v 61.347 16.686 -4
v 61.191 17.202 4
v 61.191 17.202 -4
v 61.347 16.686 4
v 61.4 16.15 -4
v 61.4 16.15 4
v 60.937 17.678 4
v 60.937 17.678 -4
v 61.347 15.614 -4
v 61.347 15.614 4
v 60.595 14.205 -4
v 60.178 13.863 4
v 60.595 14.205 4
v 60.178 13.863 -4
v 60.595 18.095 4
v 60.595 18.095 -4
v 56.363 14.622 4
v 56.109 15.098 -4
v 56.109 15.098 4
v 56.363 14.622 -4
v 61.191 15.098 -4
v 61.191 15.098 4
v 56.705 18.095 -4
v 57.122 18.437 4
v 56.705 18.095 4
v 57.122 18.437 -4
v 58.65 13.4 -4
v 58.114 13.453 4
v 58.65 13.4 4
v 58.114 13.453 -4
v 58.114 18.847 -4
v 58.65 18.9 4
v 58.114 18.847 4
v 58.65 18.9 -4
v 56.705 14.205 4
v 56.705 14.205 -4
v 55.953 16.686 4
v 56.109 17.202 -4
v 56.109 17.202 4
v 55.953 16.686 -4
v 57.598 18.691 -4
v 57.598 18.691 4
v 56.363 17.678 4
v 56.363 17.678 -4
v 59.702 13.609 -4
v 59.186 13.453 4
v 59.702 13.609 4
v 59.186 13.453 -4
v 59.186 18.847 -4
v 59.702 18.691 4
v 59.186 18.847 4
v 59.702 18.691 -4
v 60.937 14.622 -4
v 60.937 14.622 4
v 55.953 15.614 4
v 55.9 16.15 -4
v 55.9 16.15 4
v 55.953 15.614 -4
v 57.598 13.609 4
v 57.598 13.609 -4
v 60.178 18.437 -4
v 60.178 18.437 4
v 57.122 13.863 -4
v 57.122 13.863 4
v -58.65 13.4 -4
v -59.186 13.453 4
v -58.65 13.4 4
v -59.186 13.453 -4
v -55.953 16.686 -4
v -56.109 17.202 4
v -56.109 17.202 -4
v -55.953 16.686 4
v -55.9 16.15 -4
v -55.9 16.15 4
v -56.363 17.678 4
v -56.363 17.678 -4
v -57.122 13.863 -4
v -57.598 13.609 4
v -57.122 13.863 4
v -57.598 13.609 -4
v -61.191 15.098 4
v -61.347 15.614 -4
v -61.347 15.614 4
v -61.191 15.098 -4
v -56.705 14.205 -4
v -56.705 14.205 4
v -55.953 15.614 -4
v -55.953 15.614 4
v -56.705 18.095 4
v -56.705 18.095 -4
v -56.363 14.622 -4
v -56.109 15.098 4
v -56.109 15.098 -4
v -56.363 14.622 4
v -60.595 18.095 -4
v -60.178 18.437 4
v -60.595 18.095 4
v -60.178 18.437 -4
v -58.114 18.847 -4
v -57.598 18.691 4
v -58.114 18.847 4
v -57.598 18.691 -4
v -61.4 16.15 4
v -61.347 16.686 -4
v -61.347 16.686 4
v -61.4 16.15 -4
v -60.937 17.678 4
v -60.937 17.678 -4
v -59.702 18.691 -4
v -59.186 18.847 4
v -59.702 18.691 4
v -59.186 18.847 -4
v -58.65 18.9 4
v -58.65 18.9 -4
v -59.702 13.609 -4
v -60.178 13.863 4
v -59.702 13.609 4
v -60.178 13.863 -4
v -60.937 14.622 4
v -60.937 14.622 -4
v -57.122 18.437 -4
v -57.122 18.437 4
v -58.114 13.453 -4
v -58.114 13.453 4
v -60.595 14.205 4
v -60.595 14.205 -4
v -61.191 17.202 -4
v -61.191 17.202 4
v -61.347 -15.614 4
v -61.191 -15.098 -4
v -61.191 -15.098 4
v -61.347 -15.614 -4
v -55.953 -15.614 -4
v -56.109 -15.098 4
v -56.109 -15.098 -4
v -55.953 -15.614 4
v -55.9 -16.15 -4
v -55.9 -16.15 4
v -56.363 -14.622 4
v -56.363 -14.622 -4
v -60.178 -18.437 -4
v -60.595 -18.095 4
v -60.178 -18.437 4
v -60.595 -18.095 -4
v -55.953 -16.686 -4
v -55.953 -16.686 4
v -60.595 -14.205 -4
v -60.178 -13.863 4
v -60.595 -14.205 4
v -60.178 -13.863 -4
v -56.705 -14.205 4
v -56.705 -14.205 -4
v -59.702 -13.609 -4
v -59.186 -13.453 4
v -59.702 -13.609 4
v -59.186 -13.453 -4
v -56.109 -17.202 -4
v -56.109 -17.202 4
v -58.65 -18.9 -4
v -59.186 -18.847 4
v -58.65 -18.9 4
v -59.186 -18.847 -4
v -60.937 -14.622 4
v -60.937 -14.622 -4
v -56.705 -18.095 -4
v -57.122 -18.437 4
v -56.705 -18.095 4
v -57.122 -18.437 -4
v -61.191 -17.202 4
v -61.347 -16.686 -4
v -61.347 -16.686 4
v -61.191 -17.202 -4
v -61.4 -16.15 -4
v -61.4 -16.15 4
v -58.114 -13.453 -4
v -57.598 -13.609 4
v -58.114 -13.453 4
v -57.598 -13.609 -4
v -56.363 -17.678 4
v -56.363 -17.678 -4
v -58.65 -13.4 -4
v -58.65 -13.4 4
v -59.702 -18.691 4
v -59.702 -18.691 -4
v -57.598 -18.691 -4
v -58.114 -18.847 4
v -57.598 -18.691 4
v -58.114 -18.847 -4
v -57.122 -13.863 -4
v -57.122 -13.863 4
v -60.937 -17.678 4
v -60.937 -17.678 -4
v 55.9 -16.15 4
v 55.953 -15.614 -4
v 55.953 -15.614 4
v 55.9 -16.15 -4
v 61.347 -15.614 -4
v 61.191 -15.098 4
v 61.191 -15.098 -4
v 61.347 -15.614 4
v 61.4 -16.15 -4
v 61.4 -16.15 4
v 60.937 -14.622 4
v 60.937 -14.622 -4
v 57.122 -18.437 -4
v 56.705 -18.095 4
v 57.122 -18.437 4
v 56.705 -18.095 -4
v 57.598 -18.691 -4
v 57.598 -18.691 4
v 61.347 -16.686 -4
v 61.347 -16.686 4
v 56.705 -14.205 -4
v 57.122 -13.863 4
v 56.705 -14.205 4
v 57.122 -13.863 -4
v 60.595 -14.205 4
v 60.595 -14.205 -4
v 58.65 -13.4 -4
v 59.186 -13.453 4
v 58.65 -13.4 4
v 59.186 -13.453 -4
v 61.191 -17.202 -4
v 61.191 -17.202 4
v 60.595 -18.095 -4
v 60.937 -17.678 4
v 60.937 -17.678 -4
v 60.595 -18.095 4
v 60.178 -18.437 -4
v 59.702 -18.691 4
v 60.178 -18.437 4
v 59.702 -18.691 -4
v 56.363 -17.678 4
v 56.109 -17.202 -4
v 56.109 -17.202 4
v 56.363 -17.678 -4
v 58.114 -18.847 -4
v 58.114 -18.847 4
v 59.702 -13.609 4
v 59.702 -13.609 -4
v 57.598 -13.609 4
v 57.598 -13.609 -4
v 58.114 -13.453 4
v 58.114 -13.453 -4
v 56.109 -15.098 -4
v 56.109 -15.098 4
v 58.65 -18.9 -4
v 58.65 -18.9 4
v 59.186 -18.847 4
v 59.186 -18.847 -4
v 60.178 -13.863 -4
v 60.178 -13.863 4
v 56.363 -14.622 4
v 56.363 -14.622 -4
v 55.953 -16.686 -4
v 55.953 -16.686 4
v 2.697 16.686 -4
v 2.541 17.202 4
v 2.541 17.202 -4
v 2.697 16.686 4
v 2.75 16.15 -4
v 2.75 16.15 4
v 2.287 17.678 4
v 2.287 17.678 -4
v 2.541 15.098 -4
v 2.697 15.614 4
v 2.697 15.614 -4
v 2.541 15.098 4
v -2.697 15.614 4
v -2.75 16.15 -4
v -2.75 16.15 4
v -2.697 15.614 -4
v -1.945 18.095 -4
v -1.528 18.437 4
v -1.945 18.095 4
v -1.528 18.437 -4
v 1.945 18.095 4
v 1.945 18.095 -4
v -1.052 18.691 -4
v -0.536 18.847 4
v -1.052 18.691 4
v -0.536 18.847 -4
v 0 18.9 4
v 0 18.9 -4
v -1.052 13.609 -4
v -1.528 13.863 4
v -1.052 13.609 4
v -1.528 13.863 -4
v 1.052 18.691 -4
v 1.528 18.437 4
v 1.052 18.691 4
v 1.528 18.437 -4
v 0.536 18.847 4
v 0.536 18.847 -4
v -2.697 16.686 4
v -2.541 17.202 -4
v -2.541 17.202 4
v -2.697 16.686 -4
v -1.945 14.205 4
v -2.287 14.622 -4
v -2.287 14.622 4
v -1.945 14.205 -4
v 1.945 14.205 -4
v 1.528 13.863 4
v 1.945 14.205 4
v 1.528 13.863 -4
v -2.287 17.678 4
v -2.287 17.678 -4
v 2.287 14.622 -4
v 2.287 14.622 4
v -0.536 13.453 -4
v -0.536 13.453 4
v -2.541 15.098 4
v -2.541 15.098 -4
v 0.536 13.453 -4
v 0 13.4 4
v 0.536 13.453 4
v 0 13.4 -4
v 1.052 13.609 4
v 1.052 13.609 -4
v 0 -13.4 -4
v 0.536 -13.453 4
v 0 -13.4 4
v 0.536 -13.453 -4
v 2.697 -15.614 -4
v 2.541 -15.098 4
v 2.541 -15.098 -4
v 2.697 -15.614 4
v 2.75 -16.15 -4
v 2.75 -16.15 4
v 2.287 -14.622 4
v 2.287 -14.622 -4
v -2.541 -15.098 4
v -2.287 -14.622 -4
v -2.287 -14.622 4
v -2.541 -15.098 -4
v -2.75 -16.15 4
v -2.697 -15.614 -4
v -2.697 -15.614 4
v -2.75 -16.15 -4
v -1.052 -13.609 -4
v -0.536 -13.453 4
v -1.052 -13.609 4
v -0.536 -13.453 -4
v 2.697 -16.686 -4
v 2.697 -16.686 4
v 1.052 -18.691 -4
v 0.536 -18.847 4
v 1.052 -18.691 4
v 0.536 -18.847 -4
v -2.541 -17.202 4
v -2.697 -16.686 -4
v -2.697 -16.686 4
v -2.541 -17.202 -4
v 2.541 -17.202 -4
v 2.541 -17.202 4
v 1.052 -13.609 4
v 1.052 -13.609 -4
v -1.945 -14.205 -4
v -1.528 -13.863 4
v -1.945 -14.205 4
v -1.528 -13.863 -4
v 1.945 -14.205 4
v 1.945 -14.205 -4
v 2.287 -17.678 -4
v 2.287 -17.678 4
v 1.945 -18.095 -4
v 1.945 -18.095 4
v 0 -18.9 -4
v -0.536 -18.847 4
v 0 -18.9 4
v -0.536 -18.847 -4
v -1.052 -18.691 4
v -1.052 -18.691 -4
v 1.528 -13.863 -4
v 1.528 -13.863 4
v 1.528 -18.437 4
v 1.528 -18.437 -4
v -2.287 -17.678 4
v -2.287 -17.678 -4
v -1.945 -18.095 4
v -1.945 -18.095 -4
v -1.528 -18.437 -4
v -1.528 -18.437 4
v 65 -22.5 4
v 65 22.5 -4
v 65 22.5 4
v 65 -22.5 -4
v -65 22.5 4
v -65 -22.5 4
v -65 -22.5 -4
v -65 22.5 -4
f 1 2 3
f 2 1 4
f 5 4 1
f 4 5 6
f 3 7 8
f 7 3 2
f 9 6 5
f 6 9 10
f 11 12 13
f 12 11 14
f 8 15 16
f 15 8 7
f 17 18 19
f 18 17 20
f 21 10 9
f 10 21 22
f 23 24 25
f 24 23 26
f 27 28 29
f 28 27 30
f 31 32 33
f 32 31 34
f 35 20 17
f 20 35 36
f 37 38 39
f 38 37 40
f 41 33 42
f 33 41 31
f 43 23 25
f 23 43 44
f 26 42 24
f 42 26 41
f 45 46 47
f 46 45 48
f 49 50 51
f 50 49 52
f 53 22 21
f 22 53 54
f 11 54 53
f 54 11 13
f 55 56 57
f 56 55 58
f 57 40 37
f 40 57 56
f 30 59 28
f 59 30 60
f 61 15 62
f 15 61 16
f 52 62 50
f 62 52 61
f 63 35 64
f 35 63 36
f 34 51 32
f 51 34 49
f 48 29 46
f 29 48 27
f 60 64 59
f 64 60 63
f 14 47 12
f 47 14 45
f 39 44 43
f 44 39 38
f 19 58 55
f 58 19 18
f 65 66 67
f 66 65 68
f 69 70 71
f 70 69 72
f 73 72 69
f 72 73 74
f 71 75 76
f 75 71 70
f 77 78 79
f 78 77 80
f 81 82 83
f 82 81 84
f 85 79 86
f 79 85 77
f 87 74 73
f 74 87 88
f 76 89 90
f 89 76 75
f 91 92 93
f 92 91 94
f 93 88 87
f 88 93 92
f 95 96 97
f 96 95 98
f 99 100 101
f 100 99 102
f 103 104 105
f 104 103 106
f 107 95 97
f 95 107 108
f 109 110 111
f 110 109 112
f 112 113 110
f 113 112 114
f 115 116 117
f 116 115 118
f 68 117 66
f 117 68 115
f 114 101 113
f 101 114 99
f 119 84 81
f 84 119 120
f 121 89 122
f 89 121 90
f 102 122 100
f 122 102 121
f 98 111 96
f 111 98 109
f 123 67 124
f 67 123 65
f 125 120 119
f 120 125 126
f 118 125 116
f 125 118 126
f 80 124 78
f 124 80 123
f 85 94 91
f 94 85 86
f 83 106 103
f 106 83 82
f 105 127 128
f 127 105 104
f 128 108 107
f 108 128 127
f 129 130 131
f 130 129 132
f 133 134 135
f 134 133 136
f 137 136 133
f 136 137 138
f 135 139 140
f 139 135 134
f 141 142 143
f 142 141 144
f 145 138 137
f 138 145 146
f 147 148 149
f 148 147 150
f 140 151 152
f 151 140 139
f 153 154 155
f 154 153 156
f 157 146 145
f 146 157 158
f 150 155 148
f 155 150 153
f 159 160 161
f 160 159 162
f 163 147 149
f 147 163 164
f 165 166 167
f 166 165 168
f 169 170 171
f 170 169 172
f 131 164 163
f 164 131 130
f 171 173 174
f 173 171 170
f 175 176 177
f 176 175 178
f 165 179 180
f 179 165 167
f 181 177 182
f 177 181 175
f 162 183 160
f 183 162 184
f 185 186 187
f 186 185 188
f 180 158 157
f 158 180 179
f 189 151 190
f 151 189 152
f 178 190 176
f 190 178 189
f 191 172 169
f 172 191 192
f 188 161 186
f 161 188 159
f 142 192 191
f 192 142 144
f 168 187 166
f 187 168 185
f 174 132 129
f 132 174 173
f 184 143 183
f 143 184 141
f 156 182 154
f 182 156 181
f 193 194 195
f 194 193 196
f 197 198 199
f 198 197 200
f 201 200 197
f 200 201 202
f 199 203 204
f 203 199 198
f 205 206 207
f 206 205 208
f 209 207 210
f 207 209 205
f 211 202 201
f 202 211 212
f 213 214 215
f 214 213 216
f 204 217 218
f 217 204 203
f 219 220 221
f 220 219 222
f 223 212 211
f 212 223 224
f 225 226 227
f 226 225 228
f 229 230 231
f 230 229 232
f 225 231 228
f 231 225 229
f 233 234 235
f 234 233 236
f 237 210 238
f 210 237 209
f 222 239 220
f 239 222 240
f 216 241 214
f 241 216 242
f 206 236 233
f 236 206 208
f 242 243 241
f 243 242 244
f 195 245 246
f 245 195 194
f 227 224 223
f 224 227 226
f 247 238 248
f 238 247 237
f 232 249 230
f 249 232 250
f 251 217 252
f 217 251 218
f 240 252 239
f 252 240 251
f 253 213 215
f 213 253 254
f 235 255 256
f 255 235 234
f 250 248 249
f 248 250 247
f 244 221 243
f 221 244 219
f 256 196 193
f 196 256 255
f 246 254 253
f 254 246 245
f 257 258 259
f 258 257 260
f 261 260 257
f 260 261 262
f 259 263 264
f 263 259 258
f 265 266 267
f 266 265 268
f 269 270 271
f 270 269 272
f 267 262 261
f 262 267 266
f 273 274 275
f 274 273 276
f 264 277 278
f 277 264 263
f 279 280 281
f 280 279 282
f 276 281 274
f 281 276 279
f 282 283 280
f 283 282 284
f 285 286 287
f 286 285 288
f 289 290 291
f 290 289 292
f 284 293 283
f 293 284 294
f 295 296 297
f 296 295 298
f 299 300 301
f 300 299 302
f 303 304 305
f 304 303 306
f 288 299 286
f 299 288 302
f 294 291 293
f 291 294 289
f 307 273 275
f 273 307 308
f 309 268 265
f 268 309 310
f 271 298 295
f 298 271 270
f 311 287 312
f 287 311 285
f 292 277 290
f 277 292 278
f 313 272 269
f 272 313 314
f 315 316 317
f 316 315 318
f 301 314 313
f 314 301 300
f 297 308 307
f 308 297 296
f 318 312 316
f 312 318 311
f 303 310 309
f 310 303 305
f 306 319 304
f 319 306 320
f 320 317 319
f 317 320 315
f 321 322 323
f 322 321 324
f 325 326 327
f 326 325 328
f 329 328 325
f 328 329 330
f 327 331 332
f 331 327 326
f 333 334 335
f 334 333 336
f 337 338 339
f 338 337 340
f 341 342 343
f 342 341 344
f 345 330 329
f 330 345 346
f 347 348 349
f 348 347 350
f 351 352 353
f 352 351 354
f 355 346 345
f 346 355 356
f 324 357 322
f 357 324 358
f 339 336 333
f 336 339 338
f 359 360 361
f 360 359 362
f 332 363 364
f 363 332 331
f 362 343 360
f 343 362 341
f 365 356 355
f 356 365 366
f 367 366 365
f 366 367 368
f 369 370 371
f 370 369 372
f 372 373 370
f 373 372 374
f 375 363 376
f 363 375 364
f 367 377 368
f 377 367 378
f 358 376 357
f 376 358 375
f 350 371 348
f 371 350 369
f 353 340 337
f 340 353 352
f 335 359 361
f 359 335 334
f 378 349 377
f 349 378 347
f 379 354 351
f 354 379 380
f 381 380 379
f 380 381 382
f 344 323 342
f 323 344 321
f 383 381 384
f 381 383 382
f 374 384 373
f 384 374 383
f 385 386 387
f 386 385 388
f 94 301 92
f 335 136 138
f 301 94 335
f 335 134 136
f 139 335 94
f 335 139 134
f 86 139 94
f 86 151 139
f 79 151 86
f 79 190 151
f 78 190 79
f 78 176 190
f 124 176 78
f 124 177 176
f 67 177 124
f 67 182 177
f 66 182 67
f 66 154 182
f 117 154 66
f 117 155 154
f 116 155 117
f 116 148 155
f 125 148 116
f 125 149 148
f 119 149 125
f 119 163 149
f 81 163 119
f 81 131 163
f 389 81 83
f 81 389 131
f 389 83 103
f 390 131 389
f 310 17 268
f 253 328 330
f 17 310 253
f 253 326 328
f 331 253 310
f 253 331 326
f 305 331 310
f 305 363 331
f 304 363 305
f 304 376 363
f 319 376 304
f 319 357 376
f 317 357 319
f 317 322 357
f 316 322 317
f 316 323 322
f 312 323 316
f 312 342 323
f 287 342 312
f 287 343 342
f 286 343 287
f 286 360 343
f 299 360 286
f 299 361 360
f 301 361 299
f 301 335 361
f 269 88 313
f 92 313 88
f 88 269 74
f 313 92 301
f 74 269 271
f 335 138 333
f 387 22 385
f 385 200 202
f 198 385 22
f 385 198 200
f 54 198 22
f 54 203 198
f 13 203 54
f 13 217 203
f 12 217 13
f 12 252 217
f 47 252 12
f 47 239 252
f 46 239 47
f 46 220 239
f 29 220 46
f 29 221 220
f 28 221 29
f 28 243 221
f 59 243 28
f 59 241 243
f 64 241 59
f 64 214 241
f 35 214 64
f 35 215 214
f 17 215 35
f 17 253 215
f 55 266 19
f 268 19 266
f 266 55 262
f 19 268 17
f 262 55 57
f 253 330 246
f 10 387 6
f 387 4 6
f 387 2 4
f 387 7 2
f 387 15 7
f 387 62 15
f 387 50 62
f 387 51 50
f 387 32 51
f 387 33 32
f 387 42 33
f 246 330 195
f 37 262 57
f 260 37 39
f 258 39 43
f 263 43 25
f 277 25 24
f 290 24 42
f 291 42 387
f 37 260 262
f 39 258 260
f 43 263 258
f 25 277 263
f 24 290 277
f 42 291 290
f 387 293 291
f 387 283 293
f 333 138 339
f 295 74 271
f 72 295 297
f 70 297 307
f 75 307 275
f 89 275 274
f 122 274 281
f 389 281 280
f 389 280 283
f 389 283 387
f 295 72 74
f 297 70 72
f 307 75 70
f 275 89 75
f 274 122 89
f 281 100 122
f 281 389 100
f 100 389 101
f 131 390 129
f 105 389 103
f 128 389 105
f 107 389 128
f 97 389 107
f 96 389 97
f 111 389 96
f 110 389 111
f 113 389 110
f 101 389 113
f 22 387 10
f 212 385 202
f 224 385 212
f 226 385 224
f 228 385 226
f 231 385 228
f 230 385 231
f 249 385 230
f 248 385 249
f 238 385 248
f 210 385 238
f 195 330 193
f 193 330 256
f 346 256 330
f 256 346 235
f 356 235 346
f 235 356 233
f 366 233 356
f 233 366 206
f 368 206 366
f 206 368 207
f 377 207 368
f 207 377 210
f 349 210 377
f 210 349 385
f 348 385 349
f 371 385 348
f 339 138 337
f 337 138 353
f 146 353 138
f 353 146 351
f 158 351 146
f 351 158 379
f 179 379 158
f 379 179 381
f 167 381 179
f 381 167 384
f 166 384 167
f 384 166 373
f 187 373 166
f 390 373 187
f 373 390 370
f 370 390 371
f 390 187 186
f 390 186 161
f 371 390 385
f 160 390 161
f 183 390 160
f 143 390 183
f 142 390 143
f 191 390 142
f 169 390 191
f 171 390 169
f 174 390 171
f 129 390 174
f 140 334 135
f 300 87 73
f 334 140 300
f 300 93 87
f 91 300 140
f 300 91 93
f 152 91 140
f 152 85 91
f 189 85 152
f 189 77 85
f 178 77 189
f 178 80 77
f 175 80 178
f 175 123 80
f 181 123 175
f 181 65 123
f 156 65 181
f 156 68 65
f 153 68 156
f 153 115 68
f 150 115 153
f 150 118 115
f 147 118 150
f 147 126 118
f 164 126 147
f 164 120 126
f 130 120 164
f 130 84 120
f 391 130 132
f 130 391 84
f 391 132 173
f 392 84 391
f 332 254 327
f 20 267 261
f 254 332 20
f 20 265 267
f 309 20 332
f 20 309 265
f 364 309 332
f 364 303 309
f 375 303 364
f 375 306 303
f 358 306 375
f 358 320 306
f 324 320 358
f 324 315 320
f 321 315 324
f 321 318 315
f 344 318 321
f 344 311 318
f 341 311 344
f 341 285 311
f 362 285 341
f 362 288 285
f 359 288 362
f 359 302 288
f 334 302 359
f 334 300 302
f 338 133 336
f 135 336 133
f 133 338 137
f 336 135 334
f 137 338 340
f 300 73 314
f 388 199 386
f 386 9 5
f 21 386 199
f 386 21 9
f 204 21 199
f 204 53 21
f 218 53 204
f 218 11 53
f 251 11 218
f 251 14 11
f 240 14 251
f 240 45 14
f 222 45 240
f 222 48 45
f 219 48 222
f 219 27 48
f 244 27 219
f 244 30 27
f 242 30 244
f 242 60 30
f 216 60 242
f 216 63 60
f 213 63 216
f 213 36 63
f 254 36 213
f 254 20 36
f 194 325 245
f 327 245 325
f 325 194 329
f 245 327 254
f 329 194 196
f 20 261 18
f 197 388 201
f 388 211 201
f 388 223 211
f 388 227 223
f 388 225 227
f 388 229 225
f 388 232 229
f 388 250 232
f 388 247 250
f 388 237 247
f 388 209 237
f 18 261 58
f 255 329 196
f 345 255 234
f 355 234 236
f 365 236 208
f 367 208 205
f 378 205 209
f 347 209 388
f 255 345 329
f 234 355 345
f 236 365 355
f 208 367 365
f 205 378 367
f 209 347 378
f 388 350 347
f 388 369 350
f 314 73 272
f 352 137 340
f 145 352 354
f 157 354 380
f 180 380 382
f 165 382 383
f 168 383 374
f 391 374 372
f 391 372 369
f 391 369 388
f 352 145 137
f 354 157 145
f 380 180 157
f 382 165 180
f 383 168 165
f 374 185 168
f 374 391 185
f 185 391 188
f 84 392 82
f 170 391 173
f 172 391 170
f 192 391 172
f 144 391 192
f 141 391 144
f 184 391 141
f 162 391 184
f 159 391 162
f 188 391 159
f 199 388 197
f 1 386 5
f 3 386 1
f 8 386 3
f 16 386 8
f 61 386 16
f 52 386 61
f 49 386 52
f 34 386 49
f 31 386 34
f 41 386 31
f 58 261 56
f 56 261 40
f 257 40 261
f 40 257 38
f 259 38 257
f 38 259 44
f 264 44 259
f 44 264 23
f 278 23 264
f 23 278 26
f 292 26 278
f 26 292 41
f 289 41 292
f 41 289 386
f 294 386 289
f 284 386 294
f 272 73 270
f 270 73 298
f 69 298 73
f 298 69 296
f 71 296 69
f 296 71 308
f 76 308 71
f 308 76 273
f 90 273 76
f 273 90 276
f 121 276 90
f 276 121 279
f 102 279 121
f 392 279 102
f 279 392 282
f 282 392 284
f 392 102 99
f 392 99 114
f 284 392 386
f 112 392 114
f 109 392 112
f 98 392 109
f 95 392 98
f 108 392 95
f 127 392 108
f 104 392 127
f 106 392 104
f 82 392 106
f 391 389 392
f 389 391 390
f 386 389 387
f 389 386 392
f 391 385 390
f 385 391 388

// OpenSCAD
$fn = 32;

// ----------------------------------------------------------------------
// Corner plate 130 x 45 x 8
// 6 holes, centres taken from the edge offset
// ----------------------------------------------------------------------

// --- parameters (mm) ---
plate = [130, 45, 8];  // overall size (x, y, z)
holes = 6;             // number of holes the drawing asks for
hole_d = 5.5;          // hole diameter
edge = 6.35;           // hole centre offset from the plate edge

// --- derived feature positions (mm) ---
corner_x = plate[0] / 2 - edge;  // = 58.65   corner hole X
corner_y = plate[1] / 2 - edge;  // = 16.15   corner hole Y
feature_centers = [
  [corner_x, corner_y],
  [-corner_x, corner_y],
  [-corner_x, -corner_y],
  [corner_x, -corner_y],
  [0, corner_y],
  [0, -corner_y]
];   // hole centres the loop below drills

// plate outline, every hole drilled through with the same cutters
difference() {
  cube(plate, center = true);
  for (centre = feature_centers)
    translate([centre[0], centre[1], 0])
      cylinder(d = hole_d, h = plate[2] + 2, center = true);
}
